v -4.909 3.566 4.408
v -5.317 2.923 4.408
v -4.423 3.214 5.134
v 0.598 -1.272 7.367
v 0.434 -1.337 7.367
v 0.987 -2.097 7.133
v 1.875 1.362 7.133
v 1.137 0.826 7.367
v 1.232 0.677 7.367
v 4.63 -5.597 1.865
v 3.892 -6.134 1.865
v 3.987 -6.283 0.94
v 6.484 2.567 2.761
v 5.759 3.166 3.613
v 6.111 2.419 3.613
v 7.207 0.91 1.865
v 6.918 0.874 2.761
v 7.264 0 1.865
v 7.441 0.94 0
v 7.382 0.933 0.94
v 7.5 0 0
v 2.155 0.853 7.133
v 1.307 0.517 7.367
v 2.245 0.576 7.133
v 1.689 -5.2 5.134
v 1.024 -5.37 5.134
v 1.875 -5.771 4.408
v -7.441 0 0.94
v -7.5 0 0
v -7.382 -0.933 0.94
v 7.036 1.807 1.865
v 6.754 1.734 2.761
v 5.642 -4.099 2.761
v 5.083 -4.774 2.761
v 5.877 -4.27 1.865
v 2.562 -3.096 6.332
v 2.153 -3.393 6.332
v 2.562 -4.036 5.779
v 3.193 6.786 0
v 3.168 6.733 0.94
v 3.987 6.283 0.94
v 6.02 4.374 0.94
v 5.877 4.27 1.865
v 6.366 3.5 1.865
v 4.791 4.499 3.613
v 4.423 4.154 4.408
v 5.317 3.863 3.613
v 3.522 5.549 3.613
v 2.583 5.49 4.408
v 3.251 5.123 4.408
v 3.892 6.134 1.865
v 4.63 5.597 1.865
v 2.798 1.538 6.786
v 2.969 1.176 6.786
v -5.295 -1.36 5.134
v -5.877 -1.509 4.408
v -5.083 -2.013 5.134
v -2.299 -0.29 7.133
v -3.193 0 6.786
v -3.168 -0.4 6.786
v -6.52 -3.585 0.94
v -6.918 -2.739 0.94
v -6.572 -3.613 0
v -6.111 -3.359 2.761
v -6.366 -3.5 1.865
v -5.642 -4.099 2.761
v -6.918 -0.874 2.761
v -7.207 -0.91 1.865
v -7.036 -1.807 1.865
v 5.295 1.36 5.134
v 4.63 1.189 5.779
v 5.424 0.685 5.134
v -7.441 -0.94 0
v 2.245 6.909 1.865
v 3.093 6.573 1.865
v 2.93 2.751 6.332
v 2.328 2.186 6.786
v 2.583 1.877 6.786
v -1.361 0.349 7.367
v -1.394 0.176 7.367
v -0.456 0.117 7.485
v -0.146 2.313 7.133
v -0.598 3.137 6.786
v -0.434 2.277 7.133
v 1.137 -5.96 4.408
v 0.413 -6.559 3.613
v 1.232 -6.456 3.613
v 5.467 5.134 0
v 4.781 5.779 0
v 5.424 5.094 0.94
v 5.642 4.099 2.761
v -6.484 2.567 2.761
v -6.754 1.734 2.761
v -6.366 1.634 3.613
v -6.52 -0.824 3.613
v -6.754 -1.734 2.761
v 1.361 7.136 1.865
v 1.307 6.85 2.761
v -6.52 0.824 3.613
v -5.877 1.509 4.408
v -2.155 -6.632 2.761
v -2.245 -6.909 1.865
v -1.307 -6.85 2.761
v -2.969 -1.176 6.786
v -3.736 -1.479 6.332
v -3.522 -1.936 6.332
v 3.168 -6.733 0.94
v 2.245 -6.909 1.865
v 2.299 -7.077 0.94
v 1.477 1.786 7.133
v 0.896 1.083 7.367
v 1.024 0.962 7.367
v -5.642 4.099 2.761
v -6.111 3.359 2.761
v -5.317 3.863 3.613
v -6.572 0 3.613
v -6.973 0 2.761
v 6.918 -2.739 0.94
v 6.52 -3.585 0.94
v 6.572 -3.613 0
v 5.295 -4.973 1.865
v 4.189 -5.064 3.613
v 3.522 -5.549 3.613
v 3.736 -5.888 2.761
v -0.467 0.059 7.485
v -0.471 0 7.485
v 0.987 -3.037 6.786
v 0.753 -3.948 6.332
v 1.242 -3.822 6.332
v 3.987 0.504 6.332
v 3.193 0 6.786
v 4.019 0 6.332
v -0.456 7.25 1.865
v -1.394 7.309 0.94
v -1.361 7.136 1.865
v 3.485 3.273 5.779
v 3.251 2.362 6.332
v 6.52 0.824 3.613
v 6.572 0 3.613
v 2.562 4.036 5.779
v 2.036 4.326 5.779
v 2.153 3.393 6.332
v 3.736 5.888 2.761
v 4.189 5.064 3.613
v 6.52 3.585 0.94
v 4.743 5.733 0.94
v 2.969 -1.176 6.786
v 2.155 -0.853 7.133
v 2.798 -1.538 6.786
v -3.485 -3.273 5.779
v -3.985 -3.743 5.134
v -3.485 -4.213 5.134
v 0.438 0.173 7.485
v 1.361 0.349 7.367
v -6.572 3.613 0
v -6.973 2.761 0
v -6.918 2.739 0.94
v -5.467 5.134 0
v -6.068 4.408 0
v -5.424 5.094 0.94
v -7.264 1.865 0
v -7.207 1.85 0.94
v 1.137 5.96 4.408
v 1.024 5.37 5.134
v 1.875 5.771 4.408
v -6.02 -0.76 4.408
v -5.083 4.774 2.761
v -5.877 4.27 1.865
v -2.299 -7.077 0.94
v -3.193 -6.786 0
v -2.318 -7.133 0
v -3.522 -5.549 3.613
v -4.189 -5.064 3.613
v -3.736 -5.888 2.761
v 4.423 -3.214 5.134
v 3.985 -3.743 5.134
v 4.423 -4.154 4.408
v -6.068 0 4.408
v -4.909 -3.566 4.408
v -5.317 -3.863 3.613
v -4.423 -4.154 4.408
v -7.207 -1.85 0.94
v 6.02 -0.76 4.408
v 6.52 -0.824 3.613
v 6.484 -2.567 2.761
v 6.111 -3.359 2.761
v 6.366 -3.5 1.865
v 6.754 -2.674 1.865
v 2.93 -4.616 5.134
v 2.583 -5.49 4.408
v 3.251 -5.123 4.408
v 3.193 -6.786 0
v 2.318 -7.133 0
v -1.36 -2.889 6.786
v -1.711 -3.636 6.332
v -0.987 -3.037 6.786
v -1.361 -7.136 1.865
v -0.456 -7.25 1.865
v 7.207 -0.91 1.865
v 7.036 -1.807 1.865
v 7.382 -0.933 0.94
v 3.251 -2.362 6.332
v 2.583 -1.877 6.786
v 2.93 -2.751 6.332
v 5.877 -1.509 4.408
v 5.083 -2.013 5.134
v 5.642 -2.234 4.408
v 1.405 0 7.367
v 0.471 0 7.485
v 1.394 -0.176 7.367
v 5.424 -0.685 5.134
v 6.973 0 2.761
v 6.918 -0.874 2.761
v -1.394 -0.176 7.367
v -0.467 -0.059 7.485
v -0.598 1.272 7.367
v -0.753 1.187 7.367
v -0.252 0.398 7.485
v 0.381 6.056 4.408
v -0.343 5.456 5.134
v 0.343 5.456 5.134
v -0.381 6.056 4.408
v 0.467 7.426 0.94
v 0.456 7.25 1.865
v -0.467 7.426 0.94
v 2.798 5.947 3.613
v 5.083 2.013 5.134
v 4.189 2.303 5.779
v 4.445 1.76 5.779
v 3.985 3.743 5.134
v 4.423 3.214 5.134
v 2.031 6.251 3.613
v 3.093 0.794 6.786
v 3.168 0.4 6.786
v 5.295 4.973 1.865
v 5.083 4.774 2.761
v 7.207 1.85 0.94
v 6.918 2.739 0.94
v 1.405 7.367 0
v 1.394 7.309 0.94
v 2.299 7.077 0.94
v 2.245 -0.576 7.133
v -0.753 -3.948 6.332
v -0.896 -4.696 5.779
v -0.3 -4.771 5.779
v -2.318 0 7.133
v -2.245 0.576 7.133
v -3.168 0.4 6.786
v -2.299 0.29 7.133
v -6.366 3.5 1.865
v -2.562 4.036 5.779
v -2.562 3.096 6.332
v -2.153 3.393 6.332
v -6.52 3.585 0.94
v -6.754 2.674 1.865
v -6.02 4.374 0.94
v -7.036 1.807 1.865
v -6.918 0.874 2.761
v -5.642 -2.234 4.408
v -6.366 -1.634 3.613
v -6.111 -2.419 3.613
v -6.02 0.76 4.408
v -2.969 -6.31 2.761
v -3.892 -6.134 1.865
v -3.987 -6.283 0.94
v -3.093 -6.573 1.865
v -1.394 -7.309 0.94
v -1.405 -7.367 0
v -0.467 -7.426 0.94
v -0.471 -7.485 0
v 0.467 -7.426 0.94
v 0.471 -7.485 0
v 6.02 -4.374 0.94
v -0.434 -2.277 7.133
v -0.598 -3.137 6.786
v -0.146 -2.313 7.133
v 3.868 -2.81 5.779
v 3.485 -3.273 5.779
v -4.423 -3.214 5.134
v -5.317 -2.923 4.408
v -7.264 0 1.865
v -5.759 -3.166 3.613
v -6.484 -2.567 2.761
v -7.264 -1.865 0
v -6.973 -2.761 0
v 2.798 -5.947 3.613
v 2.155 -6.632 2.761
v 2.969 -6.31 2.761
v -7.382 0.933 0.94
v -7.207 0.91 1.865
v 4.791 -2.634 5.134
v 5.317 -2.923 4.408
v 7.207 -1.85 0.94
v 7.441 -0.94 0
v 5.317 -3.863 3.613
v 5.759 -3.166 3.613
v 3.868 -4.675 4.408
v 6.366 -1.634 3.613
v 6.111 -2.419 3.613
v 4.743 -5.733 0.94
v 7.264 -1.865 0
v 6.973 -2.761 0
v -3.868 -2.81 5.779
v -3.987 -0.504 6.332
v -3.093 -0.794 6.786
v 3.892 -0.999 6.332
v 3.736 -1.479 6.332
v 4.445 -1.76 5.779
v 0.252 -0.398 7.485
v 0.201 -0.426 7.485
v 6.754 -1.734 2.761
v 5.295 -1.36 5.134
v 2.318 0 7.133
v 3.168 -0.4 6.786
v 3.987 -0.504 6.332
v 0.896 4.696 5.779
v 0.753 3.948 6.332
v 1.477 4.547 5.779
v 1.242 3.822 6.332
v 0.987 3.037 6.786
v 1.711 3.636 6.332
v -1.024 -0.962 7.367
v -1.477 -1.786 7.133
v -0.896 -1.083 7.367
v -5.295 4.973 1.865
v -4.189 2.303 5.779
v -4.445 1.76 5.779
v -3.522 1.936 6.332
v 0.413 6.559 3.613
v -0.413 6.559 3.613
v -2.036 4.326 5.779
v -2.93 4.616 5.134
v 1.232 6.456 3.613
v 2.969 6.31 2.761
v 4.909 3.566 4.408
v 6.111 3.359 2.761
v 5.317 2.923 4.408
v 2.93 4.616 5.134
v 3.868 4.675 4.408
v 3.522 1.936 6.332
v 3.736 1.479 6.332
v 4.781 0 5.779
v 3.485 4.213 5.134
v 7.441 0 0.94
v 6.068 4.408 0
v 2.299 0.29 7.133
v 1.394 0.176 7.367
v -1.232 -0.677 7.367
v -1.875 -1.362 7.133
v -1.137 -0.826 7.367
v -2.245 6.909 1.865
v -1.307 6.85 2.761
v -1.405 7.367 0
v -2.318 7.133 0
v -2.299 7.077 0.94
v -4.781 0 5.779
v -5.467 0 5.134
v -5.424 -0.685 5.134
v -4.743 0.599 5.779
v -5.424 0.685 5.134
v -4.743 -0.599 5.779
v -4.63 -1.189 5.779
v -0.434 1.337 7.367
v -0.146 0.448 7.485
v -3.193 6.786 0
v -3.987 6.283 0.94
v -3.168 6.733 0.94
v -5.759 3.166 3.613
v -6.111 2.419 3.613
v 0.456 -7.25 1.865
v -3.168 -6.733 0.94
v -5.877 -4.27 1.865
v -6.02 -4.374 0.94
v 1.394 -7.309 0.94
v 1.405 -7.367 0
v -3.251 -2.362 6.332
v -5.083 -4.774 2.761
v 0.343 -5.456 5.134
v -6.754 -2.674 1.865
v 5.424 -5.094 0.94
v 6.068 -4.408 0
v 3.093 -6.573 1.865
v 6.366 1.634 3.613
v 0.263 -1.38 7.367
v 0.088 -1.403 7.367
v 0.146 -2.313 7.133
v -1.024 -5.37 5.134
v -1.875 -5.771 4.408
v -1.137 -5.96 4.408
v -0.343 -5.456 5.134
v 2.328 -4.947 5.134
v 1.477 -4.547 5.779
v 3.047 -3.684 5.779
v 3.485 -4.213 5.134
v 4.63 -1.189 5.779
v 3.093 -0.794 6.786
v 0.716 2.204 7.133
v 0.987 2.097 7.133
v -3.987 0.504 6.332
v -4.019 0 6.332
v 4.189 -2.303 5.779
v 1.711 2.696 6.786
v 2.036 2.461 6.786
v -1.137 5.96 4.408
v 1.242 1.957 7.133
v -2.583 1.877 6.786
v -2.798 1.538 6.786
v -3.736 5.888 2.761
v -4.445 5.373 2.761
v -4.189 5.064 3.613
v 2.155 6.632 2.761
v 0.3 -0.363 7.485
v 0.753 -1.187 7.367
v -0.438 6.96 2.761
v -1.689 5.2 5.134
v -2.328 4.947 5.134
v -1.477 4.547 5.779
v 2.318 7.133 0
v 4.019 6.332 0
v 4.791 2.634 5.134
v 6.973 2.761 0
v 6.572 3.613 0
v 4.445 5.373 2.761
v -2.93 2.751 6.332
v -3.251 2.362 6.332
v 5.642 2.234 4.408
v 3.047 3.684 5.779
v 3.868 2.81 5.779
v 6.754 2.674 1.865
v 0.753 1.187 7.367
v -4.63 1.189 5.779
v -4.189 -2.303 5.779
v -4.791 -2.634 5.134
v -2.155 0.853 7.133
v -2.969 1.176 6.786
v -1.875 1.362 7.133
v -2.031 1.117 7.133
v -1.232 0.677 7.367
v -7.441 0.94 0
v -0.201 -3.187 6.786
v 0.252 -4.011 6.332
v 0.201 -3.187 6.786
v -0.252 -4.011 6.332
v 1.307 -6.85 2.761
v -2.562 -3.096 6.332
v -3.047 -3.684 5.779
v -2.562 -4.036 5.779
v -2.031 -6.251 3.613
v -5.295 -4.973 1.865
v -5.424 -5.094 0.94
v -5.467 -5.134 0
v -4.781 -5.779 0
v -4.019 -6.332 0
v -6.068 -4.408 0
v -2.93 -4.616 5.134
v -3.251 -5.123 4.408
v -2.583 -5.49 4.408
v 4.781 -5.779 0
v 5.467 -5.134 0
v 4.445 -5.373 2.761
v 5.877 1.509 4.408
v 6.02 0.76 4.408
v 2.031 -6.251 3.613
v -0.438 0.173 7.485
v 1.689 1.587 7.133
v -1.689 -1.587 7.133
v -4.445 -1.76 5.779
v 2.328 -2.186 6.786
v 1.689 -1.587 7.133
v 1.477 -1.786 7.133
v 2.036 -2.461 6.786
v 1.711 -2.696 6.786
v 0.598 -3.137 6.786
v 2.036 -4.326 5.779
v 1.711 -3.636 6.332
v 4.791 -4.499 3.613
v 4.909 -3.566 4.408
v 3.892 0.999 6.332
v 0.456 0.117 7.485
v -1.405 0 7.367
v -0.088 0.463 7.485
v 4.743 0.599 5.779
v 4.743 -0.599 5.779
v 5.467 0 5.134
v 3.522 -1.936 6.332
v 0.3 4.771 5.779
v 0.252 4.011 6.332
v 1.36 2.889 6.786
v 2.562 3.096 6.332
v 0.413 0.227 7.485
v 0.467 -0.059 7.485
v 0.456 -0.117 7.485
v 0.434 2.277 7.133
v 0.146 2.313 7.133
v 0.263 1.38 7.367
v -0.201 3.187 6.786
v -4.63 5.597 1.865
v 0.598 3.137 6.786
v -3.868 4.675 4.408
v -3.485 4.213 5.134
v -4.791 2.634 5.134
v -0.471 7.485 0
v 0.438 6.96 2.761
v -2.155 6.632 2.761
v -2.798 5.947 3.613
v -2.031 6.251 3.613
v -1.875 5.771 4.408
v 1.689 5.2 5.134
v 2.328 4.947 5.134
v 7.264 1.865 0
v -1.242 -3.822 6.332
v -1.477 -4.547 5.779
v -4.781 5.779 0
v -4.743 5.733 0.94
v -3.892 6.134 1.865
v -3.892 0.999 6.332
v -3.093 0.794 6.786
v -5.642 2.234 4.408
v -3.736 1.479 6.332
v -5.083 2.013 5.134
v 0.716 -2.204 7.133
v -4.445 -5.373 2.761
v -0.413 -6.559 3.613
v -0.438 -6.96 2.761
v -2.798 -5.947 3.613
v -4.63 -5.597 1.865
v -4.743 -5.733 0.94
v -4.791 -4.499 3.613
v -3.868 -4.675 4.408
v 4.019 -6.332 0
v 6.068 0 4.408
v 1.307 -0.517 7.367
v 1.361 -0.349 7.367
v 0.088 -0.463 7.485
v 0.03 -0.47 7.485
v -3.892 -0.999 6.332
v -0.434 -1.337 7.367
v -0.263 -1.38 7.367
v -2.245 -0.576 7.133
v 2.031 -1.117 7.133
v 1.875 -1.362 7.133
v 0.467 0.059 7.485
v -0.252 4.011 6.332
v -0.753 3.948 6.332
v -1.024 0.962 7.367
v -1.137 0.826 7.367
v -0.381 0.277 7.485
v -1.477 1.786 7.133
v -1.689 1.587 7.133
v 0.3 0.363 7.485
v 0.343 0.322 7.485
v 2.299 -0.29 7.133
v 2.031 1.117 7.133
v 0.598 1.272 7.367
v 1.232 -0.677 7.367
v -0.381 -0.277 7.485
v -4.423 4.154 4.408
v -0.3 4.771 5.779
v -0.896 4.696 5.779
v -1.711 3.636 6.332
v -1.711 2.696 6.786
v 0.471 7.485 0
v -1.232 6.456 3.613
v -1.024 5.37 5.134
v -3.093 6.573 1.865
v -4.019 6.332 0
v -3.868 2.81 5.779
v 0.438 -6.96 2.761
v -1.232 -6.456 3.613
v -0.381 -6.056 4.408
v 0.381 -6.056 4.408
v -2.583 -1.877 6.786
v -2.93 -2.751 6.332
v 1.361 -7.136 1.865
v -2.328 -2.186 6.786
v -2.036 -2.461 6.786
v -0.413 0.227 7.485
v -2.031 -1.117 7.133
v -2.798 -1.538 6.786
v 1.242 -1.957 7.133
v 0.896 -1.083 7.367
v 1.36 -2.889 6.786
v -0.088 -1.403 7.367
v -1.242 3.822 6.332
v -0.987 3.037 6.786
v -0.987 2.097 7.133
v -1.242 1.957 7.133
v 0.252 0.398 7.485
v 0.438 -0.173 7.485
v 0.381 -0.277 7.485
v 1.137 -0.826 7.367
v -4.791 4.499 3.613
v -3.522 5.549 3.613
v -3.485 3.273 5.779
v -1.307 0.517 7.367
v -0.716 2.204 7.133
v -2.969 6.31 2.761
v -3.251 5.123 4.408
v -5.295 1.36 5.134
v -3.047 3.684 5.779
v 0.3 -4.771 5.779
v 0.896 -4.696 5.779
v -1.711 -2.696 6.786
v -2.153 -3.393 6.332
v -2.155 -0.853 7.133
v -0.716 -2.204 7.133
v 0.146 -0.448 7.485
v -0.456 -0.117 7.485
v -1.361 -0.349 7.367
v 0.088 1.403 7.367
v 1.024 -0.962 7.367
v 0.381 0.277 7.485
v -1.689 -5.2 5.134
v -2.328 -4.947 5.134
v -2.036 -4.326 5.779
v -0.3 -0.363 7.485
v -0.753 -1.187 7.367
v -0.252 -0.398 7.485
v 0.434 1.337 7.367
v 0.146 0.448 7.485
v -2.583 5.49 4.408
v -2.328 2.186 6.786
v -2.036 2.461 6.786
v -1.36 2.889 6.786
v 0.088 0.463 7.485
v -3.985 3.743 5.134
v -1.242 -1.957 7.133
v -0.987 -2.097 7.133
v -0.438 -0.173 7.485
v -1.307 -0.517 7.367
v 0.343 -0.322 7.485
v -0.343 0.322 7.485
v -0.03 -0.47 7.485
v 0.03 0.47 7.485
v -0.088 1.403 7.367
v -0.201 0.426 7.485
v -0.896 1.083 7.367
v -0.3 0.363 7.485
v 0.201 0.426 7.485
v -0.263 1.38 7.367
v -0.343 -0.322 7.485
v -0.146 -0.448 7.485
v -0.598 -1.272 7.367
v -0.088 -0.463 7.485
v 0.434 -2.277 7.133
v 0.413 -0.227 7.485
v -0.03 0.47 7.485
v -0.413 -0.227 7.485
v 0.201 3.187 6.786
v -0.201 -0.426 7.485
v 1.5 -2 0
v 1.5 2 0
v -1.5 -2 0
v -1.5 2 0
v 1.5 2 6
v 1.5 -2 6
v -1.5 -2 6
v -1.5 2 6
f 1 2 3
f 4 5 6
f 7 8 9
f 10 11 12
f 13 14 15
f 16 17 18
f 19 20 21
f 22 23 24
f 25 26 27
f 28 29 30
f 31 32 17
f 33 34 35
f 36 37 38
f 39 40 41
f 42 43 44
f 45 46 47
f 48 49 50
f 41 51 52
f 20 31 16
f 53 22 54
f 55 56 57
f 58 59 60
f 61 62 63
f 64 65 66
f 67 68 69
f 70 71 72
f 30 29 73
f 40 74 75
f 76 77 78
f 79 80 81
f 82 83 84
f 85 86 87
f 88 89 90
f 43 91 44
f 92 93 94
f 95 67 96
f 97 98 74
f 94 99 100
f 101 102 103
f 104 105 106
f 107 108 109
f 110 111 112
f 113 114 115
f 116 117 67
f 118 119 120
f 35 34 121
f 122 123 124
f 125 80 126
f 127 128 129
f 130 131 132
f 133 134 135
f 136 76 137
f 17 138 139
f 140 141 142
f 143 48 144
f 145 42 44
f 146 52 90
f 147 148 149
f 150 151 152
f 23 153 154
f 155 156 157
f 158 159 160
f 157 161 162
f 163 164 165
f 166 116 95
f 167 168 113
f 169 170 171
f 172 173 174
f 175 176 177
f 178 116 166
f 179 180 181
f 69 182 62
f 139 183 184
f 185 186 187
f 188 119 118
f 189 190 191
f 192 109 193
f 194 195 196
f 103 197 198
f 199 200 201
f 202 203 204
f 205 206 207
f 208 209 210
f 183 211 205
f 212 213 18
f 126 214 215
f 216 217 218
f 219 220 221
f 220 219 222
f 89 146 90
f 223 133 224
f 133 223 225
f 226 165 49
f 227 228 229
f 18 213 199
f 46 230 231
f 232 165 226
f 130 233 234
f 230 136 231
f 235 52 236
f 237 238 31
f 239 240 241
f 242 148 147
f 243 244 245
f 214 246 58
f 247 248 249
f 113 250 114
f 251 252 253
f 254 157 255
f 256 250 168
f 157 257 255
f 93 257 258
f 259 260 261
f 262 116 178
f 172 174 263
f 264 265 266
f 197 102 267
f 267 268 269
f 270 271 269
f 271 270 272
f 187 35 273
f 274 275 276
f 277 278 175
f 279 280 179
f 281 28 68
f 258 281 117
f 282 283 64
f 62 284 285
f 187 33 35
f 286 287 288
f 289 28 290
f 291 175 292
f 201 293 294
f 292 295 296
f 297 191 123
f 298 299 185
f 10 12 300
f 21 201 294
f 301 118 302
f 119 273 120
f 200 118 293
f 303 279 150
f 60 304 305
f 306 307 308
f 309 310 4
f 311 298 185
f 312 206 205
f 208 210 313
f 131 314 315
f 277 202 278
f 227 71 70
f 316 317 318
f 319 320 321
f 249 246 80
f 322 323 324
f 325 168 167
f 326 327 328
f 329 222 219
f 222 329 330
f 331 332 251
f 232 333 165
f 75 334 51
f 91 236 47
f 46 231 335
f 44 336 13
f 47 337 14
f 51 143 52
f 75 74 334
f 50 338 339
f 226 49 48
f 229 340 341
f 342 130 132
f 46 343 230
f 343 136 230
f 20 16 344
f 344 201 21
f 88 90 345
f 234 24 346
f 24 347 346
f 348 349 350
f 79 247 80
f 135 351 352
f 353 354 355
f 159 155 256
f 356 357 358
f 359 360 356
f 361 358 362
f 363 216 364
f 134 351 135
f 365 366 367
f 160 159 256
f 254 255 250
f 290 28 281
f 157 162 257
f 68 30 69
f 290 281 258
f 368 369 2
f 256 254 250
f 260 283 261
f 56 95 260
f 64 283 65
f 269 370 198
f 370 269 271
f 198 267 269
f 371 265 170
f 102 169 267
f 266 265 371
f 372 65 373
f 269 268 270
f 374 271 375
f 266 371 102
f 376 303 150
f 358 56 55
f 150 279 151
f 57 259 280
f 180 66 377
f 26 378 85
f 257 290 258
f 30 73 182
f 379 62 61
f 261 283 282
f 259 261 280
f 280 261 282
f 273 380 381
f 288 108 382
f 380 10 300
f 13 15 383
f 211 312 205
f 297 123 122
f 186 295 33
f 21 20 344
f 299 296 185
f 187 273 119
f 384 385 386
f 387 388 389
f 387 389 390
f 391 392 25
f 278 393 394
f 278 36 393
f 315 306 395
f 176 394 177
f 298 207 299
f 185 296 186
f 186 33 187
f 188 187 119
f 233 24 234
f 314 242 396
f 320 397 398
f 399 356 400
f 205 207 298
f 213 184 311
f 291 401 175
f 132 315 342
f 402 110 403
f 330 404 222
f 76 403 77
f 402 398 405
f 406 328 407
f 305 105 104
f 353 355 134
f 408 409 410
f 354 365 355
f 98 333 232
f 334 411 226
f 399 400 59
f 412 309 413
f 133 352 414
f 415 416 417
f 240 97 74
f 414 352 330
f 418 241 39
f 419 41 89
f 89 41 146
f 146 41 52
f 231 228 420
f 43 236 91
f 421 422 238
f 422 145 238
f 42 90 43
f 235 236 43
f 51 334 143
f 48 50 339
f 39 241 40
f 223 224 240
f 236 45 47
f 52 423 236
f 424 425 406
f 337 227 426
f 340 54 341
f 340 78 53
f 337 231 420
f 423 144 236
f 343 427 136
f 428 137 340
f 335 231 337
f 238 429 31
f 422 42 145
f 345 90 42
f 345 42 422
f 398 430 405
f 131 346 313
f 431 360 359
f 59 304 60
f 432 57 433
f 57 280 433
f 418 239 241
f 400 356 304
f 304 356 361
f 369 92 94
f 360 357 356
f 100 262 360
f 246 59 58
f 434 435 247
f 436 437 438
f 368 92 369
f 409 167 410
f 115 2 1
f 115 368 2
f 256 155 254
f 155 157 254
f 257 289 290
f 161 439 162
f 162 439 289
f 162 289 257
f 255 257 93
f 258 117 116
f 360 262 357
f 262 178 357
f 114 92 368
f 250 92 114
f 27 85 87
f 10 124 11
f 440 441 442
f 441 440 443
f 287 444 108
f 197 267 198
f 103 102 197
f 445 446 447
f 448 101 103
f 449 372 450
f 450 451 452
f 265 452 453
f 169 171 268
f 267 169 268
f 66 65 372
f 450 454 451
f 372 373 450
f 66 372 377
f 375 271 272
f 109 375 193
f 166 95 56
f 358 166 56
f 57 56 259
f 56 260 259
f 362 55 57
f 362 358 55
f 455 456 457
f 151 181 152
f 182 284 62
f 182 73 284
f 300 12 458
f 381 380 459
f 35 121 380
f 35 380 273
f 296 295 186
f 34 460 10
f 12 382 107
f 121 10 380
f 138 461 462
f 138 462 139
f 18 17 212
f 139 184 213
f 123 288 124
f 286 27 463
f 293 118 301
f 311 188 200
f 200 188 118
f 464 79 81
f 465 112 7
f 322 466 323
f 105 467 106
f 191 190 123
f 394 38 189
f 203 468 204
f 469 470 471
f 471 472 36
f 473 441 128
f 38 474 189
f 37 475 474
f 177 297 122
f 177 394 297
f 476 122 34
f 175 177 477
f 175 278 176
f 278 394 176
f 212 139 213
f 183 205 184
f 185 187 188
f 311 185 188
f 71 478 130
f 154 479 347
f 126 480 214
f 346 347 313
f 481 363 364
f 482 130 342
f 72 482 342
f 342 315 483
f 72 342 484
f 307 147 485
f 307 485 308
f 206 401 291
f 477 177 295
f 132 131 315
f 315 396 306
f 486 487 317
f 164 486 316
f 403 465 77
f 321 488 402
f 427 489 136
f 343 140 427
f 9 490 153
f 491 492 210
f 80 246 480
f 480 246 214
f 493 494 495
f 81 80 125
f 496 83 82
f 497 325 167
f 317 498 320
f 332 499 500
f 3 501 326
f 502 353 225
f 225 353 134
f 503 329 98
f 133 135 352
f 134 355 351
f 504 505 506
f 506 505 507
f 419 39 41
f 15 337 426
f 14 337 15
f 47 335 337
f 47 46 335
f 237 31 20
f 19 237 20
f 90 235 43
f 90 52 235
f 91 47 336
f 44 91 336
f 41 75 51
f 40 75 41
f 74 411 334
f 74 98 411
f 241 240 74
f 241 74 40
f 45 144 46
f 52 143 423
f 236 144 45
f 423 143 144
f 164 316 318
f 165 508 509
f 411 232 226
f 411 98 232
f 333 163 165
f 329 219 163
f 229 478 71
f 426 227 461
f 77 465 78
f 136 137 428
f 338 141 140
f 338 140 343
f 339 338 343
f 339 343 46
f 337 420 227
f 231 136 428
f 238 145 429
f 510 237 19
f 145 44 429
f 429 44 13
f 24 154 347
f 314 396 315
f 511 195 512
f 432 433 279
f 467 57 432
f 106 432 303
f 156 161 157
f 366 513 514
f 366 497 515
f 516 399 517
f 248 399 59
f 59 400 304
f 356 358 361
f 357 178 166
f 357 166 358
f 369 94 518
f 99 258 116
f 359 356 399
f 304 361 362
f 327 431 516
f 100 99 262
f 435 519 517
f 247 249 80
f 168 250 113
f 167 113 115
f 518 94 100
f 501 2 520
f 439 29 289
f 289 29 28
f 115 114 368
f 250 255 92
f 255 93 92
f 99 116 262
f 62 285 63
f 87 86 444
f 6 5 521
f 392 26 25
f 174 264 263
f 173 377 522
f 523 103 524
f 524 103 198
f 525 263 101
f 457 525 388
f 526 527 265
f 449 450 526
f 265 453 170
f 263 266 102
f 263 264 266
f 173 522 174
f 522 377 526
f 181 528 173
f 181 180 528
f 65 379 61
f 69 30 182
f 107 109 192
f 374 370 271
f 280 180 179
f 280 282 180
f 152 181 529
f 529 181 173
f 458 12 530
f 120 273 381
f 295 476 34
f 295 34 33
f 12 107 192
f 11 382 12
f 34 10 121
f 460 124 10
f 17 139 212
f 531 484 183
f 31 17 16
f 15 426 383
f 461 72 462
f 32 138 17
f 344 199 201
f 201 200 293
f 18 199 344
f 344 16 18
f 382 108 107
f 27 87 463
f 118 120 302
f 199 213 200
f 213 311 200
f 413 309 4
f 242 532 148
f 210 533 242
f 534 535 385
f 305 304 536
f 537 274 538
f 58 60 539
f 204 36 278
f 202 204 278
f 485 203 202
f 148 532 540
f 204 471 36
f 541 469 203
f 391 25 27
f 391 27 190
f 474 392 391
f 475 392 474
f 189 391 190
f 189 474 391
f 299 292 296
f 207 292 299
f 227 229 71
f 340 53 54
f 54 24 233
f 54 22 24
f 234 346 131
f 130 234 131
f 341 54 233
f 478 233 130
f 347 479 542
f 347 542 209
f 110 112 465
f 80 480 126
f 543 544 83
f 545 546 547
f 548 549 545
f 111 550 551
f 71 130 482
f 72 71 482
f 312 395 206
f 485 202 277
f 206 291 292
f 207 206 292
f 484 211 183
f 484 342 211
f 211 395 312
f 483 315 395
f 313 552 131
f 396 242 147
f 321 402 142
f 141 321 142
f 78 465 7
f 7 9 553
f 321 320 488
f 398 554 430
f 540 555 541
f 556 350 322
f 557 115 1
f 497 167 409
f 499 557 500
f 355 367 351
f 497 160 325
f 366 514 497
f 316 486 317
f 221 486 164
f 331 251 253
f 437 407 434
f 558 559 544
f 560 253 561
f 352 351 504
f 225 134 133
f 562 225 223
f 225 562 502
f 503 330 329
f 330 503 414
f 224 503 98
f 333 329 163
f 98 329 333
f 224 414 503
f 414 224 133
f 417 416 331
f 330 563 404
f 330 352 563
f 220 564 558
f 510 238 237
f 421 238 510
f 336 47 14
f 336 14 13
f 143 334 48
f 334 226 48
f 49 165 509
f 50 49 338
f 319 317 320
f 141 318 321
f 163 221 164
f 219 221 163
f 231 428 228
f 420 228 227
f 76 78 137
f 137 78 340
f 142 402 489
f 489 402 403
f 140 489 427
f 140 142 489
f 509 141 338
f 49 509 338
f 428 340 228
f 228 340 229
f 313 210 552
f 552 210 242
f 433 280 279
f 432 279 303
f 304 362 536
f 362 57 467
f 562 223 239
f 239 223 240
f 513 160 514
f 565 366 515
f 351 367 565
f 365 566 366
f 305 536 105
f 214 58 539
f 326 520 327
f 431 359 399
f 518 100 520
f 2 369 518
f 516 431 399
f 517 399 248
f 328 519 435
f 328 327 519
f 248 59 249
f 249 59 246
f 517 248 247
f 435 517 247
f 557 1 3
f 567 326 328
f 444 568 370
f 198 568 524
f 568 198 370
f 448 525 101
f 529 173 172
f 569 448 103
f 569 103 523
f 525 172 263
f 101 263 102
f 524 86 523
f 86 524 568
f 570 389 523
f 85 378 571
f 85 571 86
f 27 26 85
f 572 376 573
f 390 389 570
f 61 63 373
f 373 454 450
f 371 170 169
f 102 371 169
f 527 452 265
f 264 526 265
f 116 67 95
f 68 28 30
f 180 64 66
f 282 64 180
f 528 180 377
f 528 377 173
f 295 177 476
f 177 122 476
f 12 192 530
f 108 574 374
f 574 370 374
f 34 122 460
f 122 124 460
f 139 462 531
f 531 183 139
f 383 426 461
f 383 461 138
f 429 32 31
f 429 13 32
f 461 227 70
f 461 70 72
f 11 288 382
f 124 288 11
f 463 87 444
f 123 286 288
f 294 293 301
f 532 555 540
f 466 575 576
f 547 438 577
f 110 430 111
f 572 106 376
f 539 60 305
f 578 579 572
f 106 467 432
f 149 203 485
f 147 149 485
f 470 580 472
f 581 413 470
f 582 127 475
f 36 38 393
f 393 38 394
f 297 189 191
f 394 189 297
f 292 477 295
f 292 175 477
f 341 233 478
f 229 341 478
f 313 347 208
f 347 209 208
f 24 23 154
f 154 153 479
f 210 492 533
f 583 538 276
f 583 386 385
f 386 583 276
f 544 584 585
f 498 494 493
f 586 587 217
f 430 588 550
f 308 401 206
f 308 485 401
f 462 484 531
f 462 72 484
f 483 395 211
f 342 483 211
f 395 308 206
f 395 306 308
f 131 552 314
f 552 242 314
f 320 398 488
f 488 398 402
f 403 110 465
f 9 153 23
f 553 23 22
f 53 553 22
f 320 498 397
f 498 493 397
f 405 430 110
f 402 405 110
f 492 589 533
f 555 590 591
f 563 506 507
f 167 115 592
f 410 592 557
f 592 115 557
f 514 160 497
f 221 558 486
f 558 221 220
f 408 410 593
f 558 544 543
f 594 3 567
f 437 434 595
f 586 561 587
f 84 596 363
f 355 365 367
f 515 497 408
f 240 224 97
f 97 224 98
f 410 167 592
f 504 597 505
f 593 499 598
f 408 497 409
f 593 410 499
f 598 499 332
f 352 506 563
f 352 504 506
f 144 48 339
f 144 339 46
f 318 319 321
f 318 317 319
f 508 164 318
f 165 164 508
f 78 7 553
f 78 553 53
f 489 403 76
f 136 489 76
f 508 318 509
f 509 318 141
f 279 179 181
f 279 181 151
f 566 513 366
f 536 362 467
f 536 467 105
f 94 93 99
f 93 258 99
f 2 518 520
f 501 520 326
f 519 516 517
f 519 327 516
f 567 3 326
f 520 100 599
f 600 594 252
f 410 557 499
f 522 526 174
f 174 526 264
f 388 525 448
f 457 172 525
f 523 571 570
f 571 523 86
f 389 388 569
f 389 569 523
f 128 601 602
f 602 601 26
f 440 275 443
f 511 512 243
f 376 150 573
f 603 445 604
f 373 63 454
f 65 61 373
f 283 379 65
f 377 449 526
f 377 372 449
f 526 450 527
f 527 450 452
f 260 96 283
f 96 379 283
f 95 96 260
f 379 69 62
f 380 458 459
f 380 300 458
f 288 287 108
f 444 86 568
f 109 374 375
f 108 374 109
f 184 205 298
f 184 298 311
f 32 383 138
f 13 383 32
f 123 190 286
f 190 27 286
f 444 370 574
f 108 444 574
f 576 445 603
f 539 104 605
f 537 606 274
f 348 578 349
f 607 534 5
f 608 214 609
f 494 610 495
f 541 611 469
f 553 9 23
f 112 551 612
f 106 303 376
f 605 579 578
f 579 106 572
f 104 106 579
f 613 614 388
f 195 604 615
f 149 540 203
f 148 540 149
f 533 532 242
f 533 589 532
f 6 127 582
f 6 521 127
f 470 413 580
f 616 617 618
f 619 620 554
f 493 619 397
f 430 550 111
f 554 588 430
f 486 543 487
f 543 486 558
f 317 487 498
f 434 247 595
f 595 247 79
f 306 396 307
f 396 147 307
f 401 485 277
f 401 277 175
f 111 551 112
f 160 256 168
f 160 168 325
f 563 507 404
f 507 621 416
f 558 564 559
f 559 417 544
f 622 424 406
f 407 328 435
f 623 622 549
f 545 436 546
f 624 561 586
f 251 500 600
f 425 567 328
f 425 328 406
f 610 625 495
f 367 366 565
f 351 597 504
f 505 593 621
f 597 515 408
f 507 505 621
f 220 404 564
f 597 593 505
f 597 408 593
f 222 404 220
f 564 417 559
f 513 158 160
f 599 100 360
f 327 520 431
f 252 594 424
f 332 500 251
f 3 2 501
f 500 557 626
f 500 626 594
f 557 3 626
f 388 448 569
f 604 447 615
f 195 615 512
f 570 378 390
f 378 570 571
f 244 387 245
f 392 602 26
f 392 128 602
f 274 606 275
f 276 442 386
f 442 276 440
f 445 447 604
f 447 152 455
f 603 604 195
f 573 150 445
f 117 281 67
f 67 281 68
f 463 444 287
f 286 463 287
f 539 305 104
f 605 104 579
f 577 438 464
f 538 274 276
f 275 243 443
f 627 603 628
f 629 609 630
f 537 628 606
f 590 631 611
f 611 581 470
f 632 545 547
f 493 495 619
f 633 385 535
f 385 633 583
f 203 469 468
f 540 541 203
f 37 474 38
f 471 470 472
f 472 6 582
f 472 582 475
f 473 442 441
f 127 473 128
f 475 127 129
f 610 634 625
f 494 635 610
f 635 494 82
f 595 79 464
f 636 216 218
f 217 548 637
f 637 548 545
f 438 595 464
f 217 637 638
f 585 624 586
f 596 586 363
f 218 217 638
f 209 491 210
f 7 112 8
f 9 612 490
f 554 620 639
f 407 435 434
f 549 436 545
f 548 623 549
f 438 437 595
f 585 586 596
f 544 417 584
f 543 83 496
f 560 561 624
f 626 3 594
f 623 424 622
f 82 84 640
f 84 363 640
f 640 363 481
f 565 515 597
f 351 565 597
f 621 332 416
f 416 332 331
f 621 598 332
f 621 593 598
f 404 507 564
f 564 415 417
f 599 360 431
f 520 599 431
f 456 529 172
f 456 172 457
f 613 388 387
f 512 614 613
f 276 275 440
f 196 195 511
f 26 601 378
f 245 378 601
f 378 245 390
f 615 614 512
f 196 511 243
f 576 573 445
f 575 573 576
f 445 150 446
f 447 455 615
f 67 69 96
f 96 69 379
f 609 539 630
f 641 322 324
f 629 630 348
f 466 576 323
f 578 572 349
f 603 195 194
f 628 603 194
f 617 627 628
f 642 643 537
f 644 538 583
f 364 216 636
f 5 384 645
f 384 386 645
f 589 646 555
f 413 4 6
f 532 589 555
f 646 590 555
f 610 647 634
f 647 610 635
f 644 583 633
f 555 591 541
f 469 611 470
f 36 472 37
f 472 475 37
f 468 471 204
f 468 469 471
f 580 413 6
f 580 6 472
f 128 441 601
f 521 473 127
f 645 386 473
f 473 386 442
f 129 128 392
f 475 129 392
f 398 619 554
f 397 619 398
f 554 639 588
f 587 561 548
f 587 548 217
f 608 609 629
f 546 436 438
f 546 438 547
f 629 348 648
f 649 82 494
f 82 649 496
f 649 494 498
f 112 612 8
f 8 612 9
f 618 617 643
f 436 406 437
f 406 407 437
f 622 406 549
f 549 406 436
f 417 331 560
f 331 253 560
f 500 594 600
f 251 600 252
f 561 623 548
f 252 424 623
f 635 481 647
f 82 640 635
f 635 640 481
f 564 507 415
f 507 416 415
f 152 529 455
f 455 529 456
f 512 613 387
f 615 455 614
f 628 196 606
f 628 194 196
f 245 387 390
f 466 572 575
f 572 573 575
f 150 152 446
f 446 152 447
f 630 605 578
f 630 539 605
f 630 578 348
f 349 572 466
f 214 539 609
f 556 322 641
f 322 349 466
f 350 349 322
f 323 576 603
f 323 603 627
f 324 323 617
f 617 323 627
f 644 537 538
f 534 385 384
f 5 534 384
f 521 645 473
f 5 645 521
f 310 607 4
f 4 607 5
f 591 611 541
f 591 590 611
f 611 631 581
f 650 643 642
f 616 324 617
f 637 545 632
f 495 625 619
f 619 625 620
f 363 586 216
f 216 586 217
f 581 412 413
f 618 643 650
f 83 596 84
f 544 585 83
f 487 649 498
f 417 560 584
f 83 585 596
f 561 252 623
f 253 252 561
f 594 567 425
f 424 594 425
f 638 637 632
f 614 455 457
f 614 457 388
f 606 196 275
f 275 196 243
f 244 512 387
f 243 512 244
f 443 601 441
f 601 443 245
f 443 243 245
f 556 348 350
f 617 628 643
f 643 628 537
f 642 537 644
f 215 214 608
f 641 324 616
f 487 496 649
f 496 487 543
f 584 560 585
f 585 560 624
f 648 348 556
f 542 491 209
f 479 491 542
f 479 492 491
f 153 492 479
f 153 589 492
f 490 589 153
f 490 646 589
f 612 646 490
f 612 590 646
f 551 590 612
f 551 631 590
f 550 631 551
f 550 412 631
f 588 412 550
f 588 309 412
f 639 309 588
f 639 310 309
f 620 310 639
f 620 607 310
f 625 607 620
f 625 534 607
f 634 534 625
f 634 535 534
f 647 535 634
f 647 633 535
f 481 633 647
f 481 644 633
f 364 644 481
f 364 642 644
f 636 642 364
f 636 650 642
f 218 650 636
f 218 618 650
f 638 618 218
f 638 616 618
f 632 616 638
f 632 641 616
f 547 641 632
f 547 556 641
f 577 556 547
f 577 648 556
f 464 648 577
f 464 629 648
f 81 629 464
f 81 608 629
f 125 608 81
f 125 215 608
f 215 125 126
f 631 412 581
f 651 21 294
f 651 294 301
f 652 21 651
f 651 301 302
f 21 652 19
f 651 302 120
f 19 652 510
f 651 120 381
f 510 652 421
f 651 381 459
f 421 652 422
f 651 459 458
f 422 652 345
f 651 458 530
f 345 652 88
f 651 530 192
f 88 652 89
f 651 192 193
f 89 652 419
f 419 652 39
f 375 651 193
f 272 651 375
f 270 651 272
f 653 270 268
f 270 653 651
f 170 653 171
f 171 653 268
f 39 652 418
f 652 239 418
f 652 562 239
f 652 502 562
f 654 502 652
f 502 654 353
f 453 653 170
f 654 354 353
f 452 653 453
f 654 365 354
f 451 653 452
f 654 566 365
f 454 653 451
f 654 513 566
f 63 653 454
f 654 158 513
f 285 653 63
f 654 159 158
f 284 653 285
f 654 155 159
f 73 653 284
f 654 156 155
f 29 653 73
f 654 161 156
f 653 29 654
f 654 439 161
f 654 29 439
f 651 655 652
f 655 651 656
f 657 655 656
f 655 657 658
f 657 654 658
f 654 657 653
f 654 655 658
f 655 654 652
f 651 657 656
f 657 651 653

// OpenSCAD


///////////////////
///   GO CASE   ///
///
/// Designed by Chris Caswell
///  3D Central 
///  info@3dcentralva.com
/// 
/// Intention is for this project to be Open Hardware
///  http://www.oshwa.org/definition/


// This is where you put the length of your phone, in millimeters
phone_l = 139.1;
// This is where you put the width of your phone, in millimeters
phone_w = 68.5; // Add ~3mm tolerance to your measurements to account for buttons
// This is where you put the thickness of your phone, in millimeters
phone_d = 7.8;
// This measures where the camera window starts, from left to right, in millimeters
camera_x = 10.2; // Measuring from the top left of phone, to the top left corner of where camera hole should be
// This measures where the camera window starts, from top to bottom, in millimeters
camera_y = 2.6; // "X" measuring left to right, "Y" measuring up and down
// This measures the width of the camera window from left to right, in millimeters
camera_w = 22; // Width and Length of camera hole
// This measures the length of the camera window from top to bottom, in millimeters
camera_l = 8;
// This determines the width of the aimer! It will also change the cutout in the cover. Cool, right?
aimer_w = 15; // width of finger aimer
// You can put your custom text here, and it will appear on the bottom interior of the case
custom_text = "iPhone 6";


part = "button"; // [case_top:Case Top,case_bottom:Case Bottom,case_lid:Case Lid,lock_pin:Latching slide switch,button:Button,aimer_hinge:Aimer Hinge,hinge_pin:Hinge Pin]

if(part == "assembly") {
    assembly();
}
else if(part == "aimer_hinge") {
    aimer_hinge(is_open = true);
}
else if(part == "case_top") {
    translate([0,0,phone_l/2+rounding+wall_th/2]) rotate([-90,0,0]) case_top();
}
else if(part == "case_bottom") {
    translate([0,0,phone_l/2+rounding+wall_th/2]) rotate([90,0,0]) case_bottom();
}
else if(part == "case_lid") {
    translate([0,0,13]) rotate([0,180,0]) case_lid();
}
else if(part == "hinge_pin") {
    hinge_pin();
}
else if(part == "lock_pin") {
    translate([0,0,1]) rotate([0,-90,0]) lock_pin();
}
else if(part == "button") {
    button();
}


/* [Hidden] */

// General Parameters
wall_th = 3;
rounding = 2; // minkowski rounding
phone_tol = 0.3; // extra spacing around phone
$fn = 30; // smoothness
volume_l = 30; // Originally location of slot for volume controls
volume_y = 10; // Now 
button_d = 15;
throw_dist = 10; // distance slide switch moves

// Hinge Parameters
pin_l = 30;
pin_d = 8;
tol = 0.35; // tolerance on hinge

// Global constants
sqrt2 = 1.41421356237;
magnet_d = 7;
magnet_h = 2.5;


// All components, in the right place relative to one another
module assembly() {
    //translate([0,-throw_dist,0]) 
    union() {
    translate([-phone_w/2+2-1,phone_l/2-button_d-wall_th+throw_dist-3.5-2,phone_d/2+wall_th*3-5.5])  lock_pin();
    translate([-phone_w/2+2-1+3,phone_l/2-button_d-wall_th+throw_dist+1-2,phone_d/2+wall_th*3-5.5+5])  button();
    }
    //intersection() {
    case_top();
  // translate([-phone_w/2+2-1,phone_l/2-15+4,phone_d/2+wall_th*3-5.5+4]) cube([30,30,80], center=true);
    //}
    //translate([0,-5,0]) 
    case_bottom();
    translate([phone_w+pin_l+pin_d+wall_th,0,15]) rotate([0,180,0]) translate([-1,0,0]) 
    translate([0,0,-1+10]) case_lid();
    translate([phone_w/2+pin_l*3/4-1.5,pin_d*4.5,-pin_d/2]) rotate([0,0,0]) hinge_pin();
    translate([phone_w/2+pin_l*3/4-1.5,-pin_d*6,-pin_d/2]) rotate([0,0,0]) hinge_pin();
    translate([phone_w/2+pin_l*3/4-1.5,-pin_d*0,-pin_d/2]) rotate([0,0,180]) 
    aimer_hinge(is_open = true);
    //lock_pin();
    //translate([10,0,0])  lock_pin_hole();
}


// Main phone case module, where the phone sits
module phone_case() {
    echo (custom_text);
    difference() {
        minkowski() {
            translate([pin_l/6-magnet_d/2,0,wall_th/2-wall_th/2]) 
                cube([phone_w+wall_th+pin_l/3+magnet_d/2, phone_l+wall_th, phone_d+wall_th*4], center=true);
            sphere(r=rounding);
        }
        // main phone cavity
        translate([0,0,0]) cube([phone_w+phone_tol, phone_l+phone_tol, phone_d+phone_tol*2+1], center=true);
        // lock pin hole
        //translate([-phone_w/2+2-1,phone_l/2-throw_dist*2,phone_d/2+wall_th*3-5.5]) lock_pin_hole();
        translate([-phone_w/2+2-1+3,phone_l/2-volume_l/2+throw_dist/2-4,phone_d/2+wall_th*3-5.5+0.25]) lock_pin_hole();
        // camera hole
        translate([phone_w/2-camera_x-camera_w/2,phone_l/2-camera_y-camera_l/2,-phone_d*4]) 
            cube([camera_w,camera_l,phone_d*8],center=true);
        difference() {
            translate([phone_w/2-camera_x-camera_w/2,phone_l/2-camera_y-camera_l,-phone_d*4]) // taper
                rotate([0,0,45]) cube([camera_w*sqrt2/2,camera_w*sqrt2/2,phone_d*8],center=true);
            translate([phone_w/2-camera_x-camera_w/2,phone_l/2-camera_y,-phone_d*4]) 
                cube([camera_w,camera_l*2,phone_d*10],center=true);
        }
        // power plug
        translate([0,-phone_l/2,phone_d-wall_th*0.5]) cube([20,20,phone_d*2.5], center=true);
        // volume buttons
        translate([-phone_w/2-20/2,phone_l/2-volume_y-volume_l,phone_d-wall_th*2]) 
            cube([20,volume_l,phone_d*4], center=true) ;
        // hinge pin holes
        translate([phone_w/2+pin_l*3/4-2,pin_d*4.5,-pin_d/2]) hinge_pin_holes();
        translate([phone_w/2+pin_l*3/4-2,-pin_d*0,-pin_d/2]) rotate([0,0,180])  hinge_pin_holes();
        translate([phone_w/2+pin_l*3/4-2,-pin_d*6,-pin_d/2]) hinge_pin_holes();
        // magnet holes
        translate([-phone_w/2-magnet_d*0.66,0,2]) cylinder(r=magnet_d/2,h=magnet_h,center=true);
        translate([-phone_w/2-magnet_d*0.66,-phone_l/3,2]) cylinder(r=magnet_d/2,h=magnet_h,center=true);
        // code for 45 degree angle cutaway at top of phone, and top
        translate([0,0,1]) 
        union() {
            translate([0,-phone_l/2-volume_y-volume_l/2,(10+wall_th)/2]) 
                cube([phone_w*2,phone_l*2,phone_d+2], center=true);
            translate([-phone_w/2+button_d*1.5+2.5,phone_l/2-button_d*1.5-wall_th+3,(10+wall_th*3)/2]) 
                rotate([0,0,55])
                cube([button_d*sqrt2+2,button_d*sqrt2+2,phone_d*2+3], center=true);
            translate([button_d*2,phone_l/2-26.5,(10+wall_th)/2]) 
                cube([phone_w+wall_th*4+rounding*2,40,phone_d+2], center=true);
        }
        translate([0,-phone_l/2+10,-phone_d])  linear_extrude(4) text(custom_text,halign="center",valign="center");
    }       
}


// Magnetic latching lid which clamshells over phone
module case_lid() {
    intersection () {
        difference() {
            // main outer case
            minkowski() {
                translate([pin_l/6-magnet_d/2,0,0]) 
                    cube([phone_w+wall_th+pin_l/3+magnet_d/2, phone_l+wall_th, 12+wall_th*3], center=true); // 12 from 13
                sphere(r=rounding);
            }
            // main phone cavity
            cube([phone_w+phone_tol, phone_l+phone_tol, phone_d], center=true);
            // hinge pin holes
           translate([phone_w/2+pin_l*3/4-2,pin_d*4.5,13/2+3])  rotate([0,180,0]) hinge_pin_holes();
           translate([phone_w/2+pin_l*3/4-2,-pin_d*6,13/2+3]) rotate([0,180,0]) hinge_pin_holes();
            // magnet holes
            translate([-phone_w/2-magnet_d*0.66,0,4.5]) cylinder(r=magnet_d/2,h=magnet_h,center=true);
            translate([-phone_w/2-magnet_d*0.66,-phone_l/3,4.5]) cylinder(r=magnet_d/2,h=magnet_h,center=true);
            // aimer shape
            translate([0,0,6]) aimer_hole(4);
            // lock pin
            translate([-phone_w/2+2-1+3,phone_l/2-volume_l/2+throw_dist/2-4,(13+wall_th*3)*3/8]) lock_pin_hole();
            //translate([-phone_w/2+2-1,phone_l/2-throw_dist*2+3,(13+wall_th*3)*3/8]) lock_pin_hole();
        }
        
        // intersect for only lid
        translate([0,0,2]) 
        union() {
            translate([0,-phone_l/2-volume_y-volume_l/2,(10+wall_th)/2]) 
                cube([phone_w*2,phone_l*2,phone_d+2], center=true);
            translate([-phone_w/2+button_d*1.5+2.5,phone_l/2-button_d*1.5-wall_th+3,(10+wall_th*3)/2]) 
                rotate([0,0,55])
                cube([button_d*sqrt2+2,button_d*sqrt2+2,phone_d*sqrt2+4.2], center=true);
            translate([button_d*2,phone_l/2-26.5,(10+wall_th)/2]) 
                cube([phone_w+wall_th*4+rounding*2,40,phone_d+2], center=true);
        }
    }   
}

// Split phone case into two parts for printing vertically
module phone_case_lid_top() {
    intersection() {
        phone_case_lid();
        phone_cut();
    }
}
module phone_case_lid_bottom() {
    difference() {
        phone_case_lid();
        phone_cut();
    }
}

// Still a work in progress, but to do the same for the lid
module case_top() {
    intersection() {
        phone_case();
        phone_cut();
    }
}
module case_bottom() {
    difference() {
        phone_case();
        phone_cut();
    }
}
// Geometry to cut phone case in half for easier printing - using intersection and difference
module phone_cut() {
    anglecut_w = phone_l/4*sqrt2;
    difference() {
        union() {
            translate([0,phone_l/4+phone_l/2-volume_y-volume_l/2-volume_l,0]) 
                cube([phone_w*2,phone_l/2,phone_d*4], center=true);
            translate([phone_w,phone_l/4,0])
                cube([phone_w*2,phone_l/2,phone_d*4], center=true);   
            translate([0,phone_l/4,0]) rotate([0,0,45])  
                cube([anglecut_w,anglecut_w,phone_d*4], center=true);   
        }
        translate([0,0,-4-wall_th/3-4]) difference() {
            union() {
                translate([0,phone_l/4+phone_l/2-volume_y-volume_l/2-volume_l,0]) 
                    cube([phone_w*2,phone_l/2,wall_th/3], center=true);
                translate([phone_w,phone_l/4,0])
                    cube([phone_w*2,phone_l/2,wall_th/3], center=true);   
                translate([0,phone_l/4,0]) rotate([0,0,45])  
                    cube([anglecut_w,anglecut_w,wall_th/3], center=true);   
            }
            translate([0,wall_th,-2]) union() {
                translate([0,phone_l/4+phone_l/2-volume_y-volume_l/2-volume_l,0]) 
                    cube([phone_w*2,phone_l/2,phone_d*3], center=true);
                translate([phone_w,phone_l/4,0])
                    cube([phone_w*2,phone_l/2,phone_d*3], center=true);   
                translate([0,phone_l/4,0]) rotate([0,0,45]) 
                    cube([anglecut_w,anglecut_w,phone_d*4], center=true);   
            }
        }
    }
}



// Slide in pin for latching lid shut
module lock_pin() {
    $fn=50;
    pin_d = 5;
    pin_l = 15;
    lock_pin_w = 3-0.4;
    lock_pin_l = throw_dist+lock_pin_w;
    
    difference() {
        union() {
            translate([0,3/2,0]) cube([lock_pin_w,lock_pin_l+3,4], center=true);
            translate([0,throw_dist/2-0.5,pin_l/4]) cube([lock_pin_w,4,pin_l/2], center=true);
            difference() { // sphere latch
                translate([0,-throw_dist/2+1,0]) scale([0.85,1,1]) sphere(r=2,center=true);
                translate([-pin_d*2,0,0]) cube([pin_d*4,pin_d*4,pin_d*4], center=true);
            }
        }
        
        // angular cuts
        translate([0,throw_dist/2+2+3,-2]) rotate([45,0,0]) cube([10,3,3], center=true);
        translate([0,-throw_dist/2-2,-2]) rotate([-45,0,0]) cube([10,3,3], center=true);
    }
}

module button() {
    $fn=50;
    lock_pin_l = 18;
    lock_pin_w = 3;
    difference() {
        sphere(r=button_d/2, center=true);
        translate([0,0,-button_d*2]) cube([button_d*4,button_d*4,button_d*4], center=true);
        translate([0,0,-pin_l/4+3]) cube([lock_pin_w,4,pin_l/2+6], center=true);
    }
}

// slightly different from lock_pin, to adjust for tolerance in the hole
module lock_pin_hole() {
    $fn=50;
    pin_d = 5;
    pin_l = 15;
    lock_pin_l = 18+0.3;
    lock_pin_w = 3+0.05;
    translate([0,2-throw_dist/2,0]) cube([lock_pin_w,lock_pin_l+throw_dist*1.2,4.2], center=true);
    translate([0,pin_l/2-4/2-throw_dist/2,pin_l/4]) cube([lock_pin_w,4+throw_dist,pin_l/2], center=true);
    translate([0,-pin_l/3+1.5,0]) sphere(r=2,center=true);
    translate([0,-pin_l/3-throw_dist+1.5,0]) sphere(r=2,center=true);
}

// Print in place hinge 
module hinge_pin() {
    assembled_hinge_pin_out();
    translate([0,pin_l/3,0]) rotate([0,0,180]) assembled_hinge_pin_in();
}

// rotated to display hinge in closed form
module full_hinge_closed() {
    translate([0,0,pin_d*3/2]) rotate([0,180,0]) assembled_hinge_pin_out();
    translate([0,pin_l/3,0]) rotate([0,0,180]) assembled_hinge_pin_in();
}

// Hinge with additional aimer component
module aimer_hinge(pin_d=8, length=30, is_open = false) {
     difference() {
        union() {
            translate([0,-pin_l/3,pin_d/2+2]) rotate([90,0,0]) cylinder(r=pin_d/2+2, h=pin_l/3-tol, center=true);
            translate([0,pin_l/3,pin_d/2+2]) rotate([90,0,0]) cylinder(r=pin_d/2+2, h=pin_l/3-tol, center=true);
            translate([pin_l/3/2,0,pin_d/4]) cube([pin_l/3-2,pin_l*3/3-tol,pin_d/2], center=true);
            translate([pin_l/8,pin_l/3,pin_d/4]) scale([1,1,0.69]) rotate([0,90,0]) rotate([0,0,90]) 
                pin(h=pin_l/2,r=pin_d/2);
            translate([pin_l/8,-pin_l/3,pin_d/4]) scale([1,1,0.69]) rotate([0,90,0]) rotate([0,0,90]) 
                pin(h=pin_l/2,r=pin_d/2);
        }
            translate([0,0,pin_d/2+1]) rotate([90,0,0]) cylinder(r=pin_d/2+2, h=pin_l/3+tol, center=true);    
            translate([pin_d/4,0,pin_d/2]) cube([pin_d/2, pin_l/3+tol, 20], center=true);
    }
    // hinge part
    translate([0,pin_l/8+tol/2,pin_d/2+2]) rotate([90,0,0]) cylinder(r1=pin_d/2+2, r2=0, h=pin_l/12, center=true);
    translate([0,-pin_l/8-tol/2,pin_d/2+2]) rotate([0,0,180]) rotate([90,0,0]) 
        cylinder(r1=pin_d/2+2, r2=0, h=pin_l/12, center=true);
    
    //translate([0,0,pin_d+4]) rotate([0,180,0]) // is_open
    translate([0,pin_l/3,0])rotate([0,0,180]) 
    difference() {
        union() { // hinge code
            translate([0,pin_l/3,pin_d/2+2]) rotate([90,0,0]) cylinder(r=pin_d/2+2, h=pin_l/3-tol, center=true);
            // aimer arm
            translate([pin_l/4+phone_w/4+pin_d/4+1.5-aimer_w/2,pin_l/3,4/2]) 
                cube([pin_l/2+phone_w/2+pin_d/2+3-aimer_w*0.5,pin_l/3-tol*4,4], center=true);
            // plus aimer shape
            translate([phone_w/2+pin_l/2+pin_d/2+1.5,pin_l/3,4/2]) aimer_shape(4); 
        }
            translate([0,0,pin_d/2+2]) rotate([90,0,0]) cylinder(r=pin_d/2+2, h=length/3+tol, center=true);      
            translate([pin_d/4,0,pin_d/2+2]) cube([pin_d/2+2, length/3+tol, 20], center=true);   
            // hinge part
            translate([0,length/8+length/12+tol/2,pin_d/2+2]) rotate([0,0,180]) rotate([90,0,0])
                cylinder(r1=pin_d/2+2, r2=0, h=length/12, center=true);
            translate([0,-length/8-length/12-tol/2,pin_d/2+2])  rotate([90,0,0]) 
                cylinder(r1=pin_d/2+2, r2=0, h=length/12, center=true);
            translate([0,length/2-length/24-tol/2,pin_d/2+2]) rotate([90,0,0]) 
                cylinder(r1=pin_d/2+2, r2=0, h=length/12, center=true);   
    } 
}


// Oval shape of aimer, added to a hinge
module aimer_shape(th=4) {
    aimer_offset = 7; // lower number will have aimer extend beyond bottom further
    difference() {
        union() {
            translate([0,phone_l/4+aimer_offset,0]) cylinder(r=aimer_w*3/4, h=th, center=true);
            translate([0,-phone_l/2+aimer_offset,0]) cylinder(r=aimer_w*3/4, h=th, center=true);
            translate([0,-phone_l/8+aimer_offset,0]) cube([aimer_w*3/4*2,phone_l*3/4,th], center=true);
        }
            translate([0,phone_l/4+aimer_offset,0]) cylinder(r=aimer_w/2, h=th*2, center=true);
            translate([0,-phone_l/2+aimer_offset,0]) cylinder(r=aimer_w/2, h=th*2, center=true);
            translate([0,-phone_l/8+aimer_offset,0]) cube([aimer_w,phone_l/4+phone_l/2,th*2], center=true);
    }
}

// Outline of aimer component, to be subtracted from lid
module aimer_hole(th=4) {
    aimer_offset = 7; // lower number will have aimer extend beyond bottom further
    union() {
        translate([0.5,phone_l/4+aimer_offset,0]) cylinder(r=aimer_w*3/4+1, h=th*2, center=true);
        translate([0.5,-phone_l/2+aimer_offset,0]) cylinder(r=aimer_w*3/4+1, h=th*2, center=true);
        translate([0.5,-phone_l/8+aimer_offset,0]) cube([aimer_w*3/4*2+2,phone_l/4+phone_l/2+2,th*2], center=true);
        //attachment peg
        translate([phone_l/2/2,0,0]) cube([phone_l/2+2,11,th*2], center=true);
    }
}

// Hole
module hinge_pin_holes(pin_d=8, length=30)  {
    union() {
        translate([length/8,length/3,pin_d/4]) scale([1,1,0.69]) rotate([0,90,0]) rotate([0,0,90]) 
            pinhole(h=length/2,r=pin_d/2, fixed=true);
        translate([length/8,-length/3,pin_d/4]) scale([1,1,0.69]) rotate([0,90,0]) rotate([0,0,90]) 
            pinhole(h=length/2,r=pin_d/2, fixed=true);
    }
    translate([0,length/3,0]) 
    rotate([0,0,180]) 
    union() {
        translate([length/8,length/3,pin_d/4]) scale([1,1,0.69]) rotate([0,90,0]) rotate([0,0,90]) 
            pinhole(h=length/2,r=pin_d/2, fixed=true);
        translate([length/8,-length/3,pin_d/4]) scale([1,1,0.69]) rotate([0,90,0]) rotate([0,0,90]) 
            pinhole(h=length/2,r=pin_d/2, fixed=true);
    }
}

// Hinge helper functions
module assembled_hinge_pin_out(pin_d=8, length=30) {
    difference() {
        union() {
            translate([0,-length/3,pin_d/2+2]) rotate([90,0,0]) cylinder(r=pin_d/2+2, h=length/3-tol, center=true);
            translate([0,length/3,pin_d/2+2]) rotate([90,0,0]) cylinder(r=pin_d/2+2, h=length/3-tol, center=true);
            translate([length/3/2,0,pin_d/4]) cube([length/3-2,length*3/3-tol,pin_d/2], center=true);
            translate([length/8,length/3,pin_d/4]) scale([1,1,0.69]) rotate([0,90,0]) rotate([0,0,90]) 
                pin(h=length/2,r=pin_d/2);
            translate([length/8,-length/3,pin_d/4]) scale([1,1,0.69]) rotate([0,90,0]) rotate([0,0,90]) 
                pin(h=length/2,r=pin_d/2);
        }
            translate([0,0,pin_d/2+1]) rotate([90,0,0]) cylinder(r=pin_d/2+2.3, h=length/3+tol, center=true);    
            translate([pin_d/4,0,pin_d/2]) cube([pin_d/2, length/3+tol, 20], center=true);
    }
    // hinge part
    translate([0,length/8+tol/2,pin_d/2+2]) rotate([90,0,0]) cylinder(r1=pin_d/2+2, r2=0, h=length/12, center=true);
    translate([0,-length/8-tol/2,pin_d/2+2]) rotate([0,0,180]) rotate([90,0,0]) 
        cylinder(r1=pin_d/2+2, r2=0, h=length/12, center=true);
    translate([0,length/2+length/24-tol/2,pin_d/2+2])  rotate([0,0,180]) rotate([90,0,0]) 
        cylinder(r1=pin_d/2+2, r2=0, h=length/12, center=true);
}

module assembled_hinge_pin_in(pin_d=8, length=30) {
    difference() {
        union() {
            translate([0,-length/3,pin_d/2+2]) rotate([90,0,0]) cylinder(r=pin_d/2+2, h=length/3-tol, center=true);
            translate([0,length/3,pin_d/2+2]) rotate([90,0,0]) cylinder(r=pin_d/2+2, h=length/3-tol, center=true);
            translate([length/3/2,0,pin_d/4]) cube([length/3-2,length*3/3-tol,pin_d/2], center=true);
            translate([length/8,length/3,pin_d/4]) scale([1,1,0.69]) rotate([0,90,0]) rotate([0,0,90]) 
                pin(h=length/2,r=pin_d/2);
            translate([length/8,-length/3,pin_d/4]) scale([1,1,0.69]) rotate([0,90,0]) rotate([0,0,90]) 
                pin(h=length/2,r=pin_d/2);
        }
            translate([0,0,pin_d/2+2]) rotate([90,0,0]) cylinder(r=pin_d/2+2.3, h=length/3+tol, center=true);      
            translate([pin_d/4,0,pin_d/2+2]) cube([pin_d/2+2, length/3+tol, 20], center=true);   
        // hinge part

        translate([0,length/8+length/12+tol/2,pin_d/2+2]) rotate([0,0,180]) rotate([90,0,0])
            cylinder(r1=pin_d/2+2, r2=0, h=length/12, center=true);
        translate([0,-length/8-length/12-tol/2,pin_d/2+2])  rotate([90,0,0]) 
            cylinder(r1=pin_d/2+2, r2=0, h=length/12, center=true);
        translate([0,length/2-length/24-tol/2,pin_d/2+2]) rotate([90,0,0]) 
            cylinder(r1=pin_d/2+2, r2=0, h=length/12, center=true);   
    } 
}

module hinge_hole(){
    translate([0,pin_l/2,pin_d/2]) 
    union() {
        rotate([90,0,0]) pinhole(h=pin_l,r=pin_d/2);
        rotate([90,0,0]) translate([0,0,pin_l]) rotate([0,180,0]) pinhole(h=pin_l,r=pin_d/2);
    }
    scale([1,1.3,1]) 
    translate([0,0,pin_d/2]) rotate([0,90,0]) pinhole(h=pin_l/2,r=pin_d/2);
}



////////////////////// PINS imbedded here ///////////////////////////

// Pin Connectors V3
// Tony Buser <tbuser@gmail.com>
// Modified by Emmett Lalish

length=20;
diameter=8;
//Only affects pinhole
hole_twist=0;//[0:free,1:fixed]
//Only affects pinhole
hole_friction=0;//[0:loose,1:tight]
//Radial gap to help pins fit into tight holes
pin_tolerance=0.2;
//Extra gap to make loose hole
loose=0.3;
lip_height=3;
lip_thickness=1;
hf=hole_friction==0 ? false : true;
ht=hole_twist==0 ? false : true;


module pinhole(h=10, r=4, lh=3, lt=1, t=0.3, tight=true, fixed=false) {
  // h = shaft height
  // r = shaft radius
  // lh = lip height
  // lt = lip thickness
  // t = extra tolerance for loose fit
  // tight = set to false if you want a joint that spins easily
  // fixed = set to true so pins can't spin
  
intersection(){
  union() {
	if (tight == true || fixed == true) {
      pin_solid(h, r, lh, lt);
	  translate([0,0,-t/2])cylinder(h=h+t, r=r, $fn=30);
	} else {
	  pin_solid(h, r+t/2, lh, lt);
	  translate([0,0,-t/2])cylinder(h=h+t, r=r+t/2, $fn=30);
	}
    
    
    // widen the entrance hole to make insertion easier
    //translate([0, 0, -0.1]) cylinder(h=lh/3, r2=r, r1=r+(t/2)+(lt/2),$fn=30);
  }
  if (fixed == true) {
	translate([-r*2, -r*0.75, -1])cube([r*4, r*1.5, h+2]);
  }
}}

module pin(h=10, r=4, lh=3, lt=1, t=0.2, side=false) {
  // h = shaft height
  // r = shaft radius
  // lh = lip height
  // lt = lip thickness
  // side = set to true if you want it printed horizontally

  if (side) {
    pin_horizontal(h, r, lh, lt, t);
  } else {
    pin_vertical(h, r, lh, lt, t);
  }
}

module pintack(h=10, r=4, lh=3, lt=1, t=0.2, bh=3, br=8.75) {
  // bh = base_height
  // br = base_radius
  
  union() {
    cylinder(h=bh, r=br);
    translate([0, 0, bh]) pin(h, r, lh, lt, t);
  }
}

module pinpeg(h=20, r=4, lh=3, lt=1, t=0.2) {
  union() {
    translate([0,-0.05, 0]) pin(h/2+0.1, r, lh, lt, t, side=true);
    translate([0,0.05, 0]) rotate([0, 0, 180]) pin(h/2+0.1, r, lh, lt, t, side=true);
  }
}

// just call pin instead, I made this module because it was easier to do the rotation option this way
// since openscad complains of recursion if I did it all in one module
module pin_vertical(h=10, r=4, lh=3, lt=1, t=0.2) {
  // h = shaft height
  // r = shaft radius
  // lh = lip height
  // lt = lip thickness

  difference() {
    pin_solid(h, r-t/2, lh, lt);
    
    // center cut
    translate([-lt*3/2, -(r*2+lt*2)/2, h/2+lt*3/2]) cube([lt*3, r*2+lt*2, h]);
    //translate([0, 0, h/4]) cylinder(h=h+lh, r=r/2.5, $fn=20);
    // center curve
    translate([0, 0, h/2+lt*3/2]) rotate([90, 0, 0]) cylinder(h=r*2, r=lt*3/2, center=true, $fn=20);
  
    // side cuts
    translate([-r*2, -r-r*0.75+t/2, -1]) cube([r*4, r, h+2]);
    translate([-r*2, r*0.75-t/2, -1]) cube([r*4, r, h+2]);
  }
}

// call pin with side=true instead of this
module pin_horizontal(h=10, r=4, lh=3, lt=1, t=0.2) {
  // h = shaft height
  // r = shaft radius
  // lh = lip height
  // lt = lip thickness
  translate([0, 0, r*0.75-t/2]) rotate([-90, 0, 0]) pin_vertical(h, r, lh, lt, t);
}

// this is mainly to make the pinhole module easier
module pin_solid(h=10, r=4, lh=3, lt=1) {
  union() {
    // shaft
    cylinder(h=h-lh, r=r, $fn=30);
    // lip
    // translate([0, 0, h-lh]) cylinder(h=lh*0.25, r1=r, r2=r+(lt/2), $fn=30);
    // translate([0, 0, h-lh+lh*0.25]) cylinder(h=lh*0.25, r2=r, r1=r+(lt/2), $fn=30);
    // translate([0, 0, h-lh+lh*0.50]) cylinder(h=lh*0.50, r1=r, r2=r-(lt/2), $fn=30);

    // translate([0, 0, h-lh]) cylinder(h=lh*0.50, r1=r, r2=r+(lt/2), $fn=30);
    // translate([0, 0, h-lh+lh*0.50]) cylinder(h=lh*0.50, r1=r+(lt/2), r2=r-(lt/3), $fn=30);    

    translate([0, 0, h-lh]) cylinder(h=lh*0.25, r1=r, r2=r+(lt/2), $fn=30);
    translate([0, 0, h-lh+lh*0.25]) cylinder(h=lh*0.25, r=r+(lt/2), $fn=30);    
    translate([0, 0, h-lh+lh*0.50]) cylinder(h=lh*0.50, r1=r+(lt/2), r2=r-(lt/2), $fn=30);    

    // translate([0, 0, h-lh]) cylinder(h=lh, r1=r+(lt/2), r2=1, $fn=30);
    // translate([0, 0, h-lh-lt/2]) cylinder(h=lt/2, r1=r, r2=r+(lt/2), $fn=30);
  }
}

module pinshaft(h=10, r=4, t=0.2, side=false){
flip=side ? 1 : 0;
translate(flip*[0,h/2,r*0.75-t/2])rotate(flip*[90,0,0])
intersection(){
	cylinder(h=h, r=r-t/2, $fn=30);
	translate([-r*2, -r*0.75+t/2, -1])cube([r*4, r*1.5-t, h+2]);
}
}

